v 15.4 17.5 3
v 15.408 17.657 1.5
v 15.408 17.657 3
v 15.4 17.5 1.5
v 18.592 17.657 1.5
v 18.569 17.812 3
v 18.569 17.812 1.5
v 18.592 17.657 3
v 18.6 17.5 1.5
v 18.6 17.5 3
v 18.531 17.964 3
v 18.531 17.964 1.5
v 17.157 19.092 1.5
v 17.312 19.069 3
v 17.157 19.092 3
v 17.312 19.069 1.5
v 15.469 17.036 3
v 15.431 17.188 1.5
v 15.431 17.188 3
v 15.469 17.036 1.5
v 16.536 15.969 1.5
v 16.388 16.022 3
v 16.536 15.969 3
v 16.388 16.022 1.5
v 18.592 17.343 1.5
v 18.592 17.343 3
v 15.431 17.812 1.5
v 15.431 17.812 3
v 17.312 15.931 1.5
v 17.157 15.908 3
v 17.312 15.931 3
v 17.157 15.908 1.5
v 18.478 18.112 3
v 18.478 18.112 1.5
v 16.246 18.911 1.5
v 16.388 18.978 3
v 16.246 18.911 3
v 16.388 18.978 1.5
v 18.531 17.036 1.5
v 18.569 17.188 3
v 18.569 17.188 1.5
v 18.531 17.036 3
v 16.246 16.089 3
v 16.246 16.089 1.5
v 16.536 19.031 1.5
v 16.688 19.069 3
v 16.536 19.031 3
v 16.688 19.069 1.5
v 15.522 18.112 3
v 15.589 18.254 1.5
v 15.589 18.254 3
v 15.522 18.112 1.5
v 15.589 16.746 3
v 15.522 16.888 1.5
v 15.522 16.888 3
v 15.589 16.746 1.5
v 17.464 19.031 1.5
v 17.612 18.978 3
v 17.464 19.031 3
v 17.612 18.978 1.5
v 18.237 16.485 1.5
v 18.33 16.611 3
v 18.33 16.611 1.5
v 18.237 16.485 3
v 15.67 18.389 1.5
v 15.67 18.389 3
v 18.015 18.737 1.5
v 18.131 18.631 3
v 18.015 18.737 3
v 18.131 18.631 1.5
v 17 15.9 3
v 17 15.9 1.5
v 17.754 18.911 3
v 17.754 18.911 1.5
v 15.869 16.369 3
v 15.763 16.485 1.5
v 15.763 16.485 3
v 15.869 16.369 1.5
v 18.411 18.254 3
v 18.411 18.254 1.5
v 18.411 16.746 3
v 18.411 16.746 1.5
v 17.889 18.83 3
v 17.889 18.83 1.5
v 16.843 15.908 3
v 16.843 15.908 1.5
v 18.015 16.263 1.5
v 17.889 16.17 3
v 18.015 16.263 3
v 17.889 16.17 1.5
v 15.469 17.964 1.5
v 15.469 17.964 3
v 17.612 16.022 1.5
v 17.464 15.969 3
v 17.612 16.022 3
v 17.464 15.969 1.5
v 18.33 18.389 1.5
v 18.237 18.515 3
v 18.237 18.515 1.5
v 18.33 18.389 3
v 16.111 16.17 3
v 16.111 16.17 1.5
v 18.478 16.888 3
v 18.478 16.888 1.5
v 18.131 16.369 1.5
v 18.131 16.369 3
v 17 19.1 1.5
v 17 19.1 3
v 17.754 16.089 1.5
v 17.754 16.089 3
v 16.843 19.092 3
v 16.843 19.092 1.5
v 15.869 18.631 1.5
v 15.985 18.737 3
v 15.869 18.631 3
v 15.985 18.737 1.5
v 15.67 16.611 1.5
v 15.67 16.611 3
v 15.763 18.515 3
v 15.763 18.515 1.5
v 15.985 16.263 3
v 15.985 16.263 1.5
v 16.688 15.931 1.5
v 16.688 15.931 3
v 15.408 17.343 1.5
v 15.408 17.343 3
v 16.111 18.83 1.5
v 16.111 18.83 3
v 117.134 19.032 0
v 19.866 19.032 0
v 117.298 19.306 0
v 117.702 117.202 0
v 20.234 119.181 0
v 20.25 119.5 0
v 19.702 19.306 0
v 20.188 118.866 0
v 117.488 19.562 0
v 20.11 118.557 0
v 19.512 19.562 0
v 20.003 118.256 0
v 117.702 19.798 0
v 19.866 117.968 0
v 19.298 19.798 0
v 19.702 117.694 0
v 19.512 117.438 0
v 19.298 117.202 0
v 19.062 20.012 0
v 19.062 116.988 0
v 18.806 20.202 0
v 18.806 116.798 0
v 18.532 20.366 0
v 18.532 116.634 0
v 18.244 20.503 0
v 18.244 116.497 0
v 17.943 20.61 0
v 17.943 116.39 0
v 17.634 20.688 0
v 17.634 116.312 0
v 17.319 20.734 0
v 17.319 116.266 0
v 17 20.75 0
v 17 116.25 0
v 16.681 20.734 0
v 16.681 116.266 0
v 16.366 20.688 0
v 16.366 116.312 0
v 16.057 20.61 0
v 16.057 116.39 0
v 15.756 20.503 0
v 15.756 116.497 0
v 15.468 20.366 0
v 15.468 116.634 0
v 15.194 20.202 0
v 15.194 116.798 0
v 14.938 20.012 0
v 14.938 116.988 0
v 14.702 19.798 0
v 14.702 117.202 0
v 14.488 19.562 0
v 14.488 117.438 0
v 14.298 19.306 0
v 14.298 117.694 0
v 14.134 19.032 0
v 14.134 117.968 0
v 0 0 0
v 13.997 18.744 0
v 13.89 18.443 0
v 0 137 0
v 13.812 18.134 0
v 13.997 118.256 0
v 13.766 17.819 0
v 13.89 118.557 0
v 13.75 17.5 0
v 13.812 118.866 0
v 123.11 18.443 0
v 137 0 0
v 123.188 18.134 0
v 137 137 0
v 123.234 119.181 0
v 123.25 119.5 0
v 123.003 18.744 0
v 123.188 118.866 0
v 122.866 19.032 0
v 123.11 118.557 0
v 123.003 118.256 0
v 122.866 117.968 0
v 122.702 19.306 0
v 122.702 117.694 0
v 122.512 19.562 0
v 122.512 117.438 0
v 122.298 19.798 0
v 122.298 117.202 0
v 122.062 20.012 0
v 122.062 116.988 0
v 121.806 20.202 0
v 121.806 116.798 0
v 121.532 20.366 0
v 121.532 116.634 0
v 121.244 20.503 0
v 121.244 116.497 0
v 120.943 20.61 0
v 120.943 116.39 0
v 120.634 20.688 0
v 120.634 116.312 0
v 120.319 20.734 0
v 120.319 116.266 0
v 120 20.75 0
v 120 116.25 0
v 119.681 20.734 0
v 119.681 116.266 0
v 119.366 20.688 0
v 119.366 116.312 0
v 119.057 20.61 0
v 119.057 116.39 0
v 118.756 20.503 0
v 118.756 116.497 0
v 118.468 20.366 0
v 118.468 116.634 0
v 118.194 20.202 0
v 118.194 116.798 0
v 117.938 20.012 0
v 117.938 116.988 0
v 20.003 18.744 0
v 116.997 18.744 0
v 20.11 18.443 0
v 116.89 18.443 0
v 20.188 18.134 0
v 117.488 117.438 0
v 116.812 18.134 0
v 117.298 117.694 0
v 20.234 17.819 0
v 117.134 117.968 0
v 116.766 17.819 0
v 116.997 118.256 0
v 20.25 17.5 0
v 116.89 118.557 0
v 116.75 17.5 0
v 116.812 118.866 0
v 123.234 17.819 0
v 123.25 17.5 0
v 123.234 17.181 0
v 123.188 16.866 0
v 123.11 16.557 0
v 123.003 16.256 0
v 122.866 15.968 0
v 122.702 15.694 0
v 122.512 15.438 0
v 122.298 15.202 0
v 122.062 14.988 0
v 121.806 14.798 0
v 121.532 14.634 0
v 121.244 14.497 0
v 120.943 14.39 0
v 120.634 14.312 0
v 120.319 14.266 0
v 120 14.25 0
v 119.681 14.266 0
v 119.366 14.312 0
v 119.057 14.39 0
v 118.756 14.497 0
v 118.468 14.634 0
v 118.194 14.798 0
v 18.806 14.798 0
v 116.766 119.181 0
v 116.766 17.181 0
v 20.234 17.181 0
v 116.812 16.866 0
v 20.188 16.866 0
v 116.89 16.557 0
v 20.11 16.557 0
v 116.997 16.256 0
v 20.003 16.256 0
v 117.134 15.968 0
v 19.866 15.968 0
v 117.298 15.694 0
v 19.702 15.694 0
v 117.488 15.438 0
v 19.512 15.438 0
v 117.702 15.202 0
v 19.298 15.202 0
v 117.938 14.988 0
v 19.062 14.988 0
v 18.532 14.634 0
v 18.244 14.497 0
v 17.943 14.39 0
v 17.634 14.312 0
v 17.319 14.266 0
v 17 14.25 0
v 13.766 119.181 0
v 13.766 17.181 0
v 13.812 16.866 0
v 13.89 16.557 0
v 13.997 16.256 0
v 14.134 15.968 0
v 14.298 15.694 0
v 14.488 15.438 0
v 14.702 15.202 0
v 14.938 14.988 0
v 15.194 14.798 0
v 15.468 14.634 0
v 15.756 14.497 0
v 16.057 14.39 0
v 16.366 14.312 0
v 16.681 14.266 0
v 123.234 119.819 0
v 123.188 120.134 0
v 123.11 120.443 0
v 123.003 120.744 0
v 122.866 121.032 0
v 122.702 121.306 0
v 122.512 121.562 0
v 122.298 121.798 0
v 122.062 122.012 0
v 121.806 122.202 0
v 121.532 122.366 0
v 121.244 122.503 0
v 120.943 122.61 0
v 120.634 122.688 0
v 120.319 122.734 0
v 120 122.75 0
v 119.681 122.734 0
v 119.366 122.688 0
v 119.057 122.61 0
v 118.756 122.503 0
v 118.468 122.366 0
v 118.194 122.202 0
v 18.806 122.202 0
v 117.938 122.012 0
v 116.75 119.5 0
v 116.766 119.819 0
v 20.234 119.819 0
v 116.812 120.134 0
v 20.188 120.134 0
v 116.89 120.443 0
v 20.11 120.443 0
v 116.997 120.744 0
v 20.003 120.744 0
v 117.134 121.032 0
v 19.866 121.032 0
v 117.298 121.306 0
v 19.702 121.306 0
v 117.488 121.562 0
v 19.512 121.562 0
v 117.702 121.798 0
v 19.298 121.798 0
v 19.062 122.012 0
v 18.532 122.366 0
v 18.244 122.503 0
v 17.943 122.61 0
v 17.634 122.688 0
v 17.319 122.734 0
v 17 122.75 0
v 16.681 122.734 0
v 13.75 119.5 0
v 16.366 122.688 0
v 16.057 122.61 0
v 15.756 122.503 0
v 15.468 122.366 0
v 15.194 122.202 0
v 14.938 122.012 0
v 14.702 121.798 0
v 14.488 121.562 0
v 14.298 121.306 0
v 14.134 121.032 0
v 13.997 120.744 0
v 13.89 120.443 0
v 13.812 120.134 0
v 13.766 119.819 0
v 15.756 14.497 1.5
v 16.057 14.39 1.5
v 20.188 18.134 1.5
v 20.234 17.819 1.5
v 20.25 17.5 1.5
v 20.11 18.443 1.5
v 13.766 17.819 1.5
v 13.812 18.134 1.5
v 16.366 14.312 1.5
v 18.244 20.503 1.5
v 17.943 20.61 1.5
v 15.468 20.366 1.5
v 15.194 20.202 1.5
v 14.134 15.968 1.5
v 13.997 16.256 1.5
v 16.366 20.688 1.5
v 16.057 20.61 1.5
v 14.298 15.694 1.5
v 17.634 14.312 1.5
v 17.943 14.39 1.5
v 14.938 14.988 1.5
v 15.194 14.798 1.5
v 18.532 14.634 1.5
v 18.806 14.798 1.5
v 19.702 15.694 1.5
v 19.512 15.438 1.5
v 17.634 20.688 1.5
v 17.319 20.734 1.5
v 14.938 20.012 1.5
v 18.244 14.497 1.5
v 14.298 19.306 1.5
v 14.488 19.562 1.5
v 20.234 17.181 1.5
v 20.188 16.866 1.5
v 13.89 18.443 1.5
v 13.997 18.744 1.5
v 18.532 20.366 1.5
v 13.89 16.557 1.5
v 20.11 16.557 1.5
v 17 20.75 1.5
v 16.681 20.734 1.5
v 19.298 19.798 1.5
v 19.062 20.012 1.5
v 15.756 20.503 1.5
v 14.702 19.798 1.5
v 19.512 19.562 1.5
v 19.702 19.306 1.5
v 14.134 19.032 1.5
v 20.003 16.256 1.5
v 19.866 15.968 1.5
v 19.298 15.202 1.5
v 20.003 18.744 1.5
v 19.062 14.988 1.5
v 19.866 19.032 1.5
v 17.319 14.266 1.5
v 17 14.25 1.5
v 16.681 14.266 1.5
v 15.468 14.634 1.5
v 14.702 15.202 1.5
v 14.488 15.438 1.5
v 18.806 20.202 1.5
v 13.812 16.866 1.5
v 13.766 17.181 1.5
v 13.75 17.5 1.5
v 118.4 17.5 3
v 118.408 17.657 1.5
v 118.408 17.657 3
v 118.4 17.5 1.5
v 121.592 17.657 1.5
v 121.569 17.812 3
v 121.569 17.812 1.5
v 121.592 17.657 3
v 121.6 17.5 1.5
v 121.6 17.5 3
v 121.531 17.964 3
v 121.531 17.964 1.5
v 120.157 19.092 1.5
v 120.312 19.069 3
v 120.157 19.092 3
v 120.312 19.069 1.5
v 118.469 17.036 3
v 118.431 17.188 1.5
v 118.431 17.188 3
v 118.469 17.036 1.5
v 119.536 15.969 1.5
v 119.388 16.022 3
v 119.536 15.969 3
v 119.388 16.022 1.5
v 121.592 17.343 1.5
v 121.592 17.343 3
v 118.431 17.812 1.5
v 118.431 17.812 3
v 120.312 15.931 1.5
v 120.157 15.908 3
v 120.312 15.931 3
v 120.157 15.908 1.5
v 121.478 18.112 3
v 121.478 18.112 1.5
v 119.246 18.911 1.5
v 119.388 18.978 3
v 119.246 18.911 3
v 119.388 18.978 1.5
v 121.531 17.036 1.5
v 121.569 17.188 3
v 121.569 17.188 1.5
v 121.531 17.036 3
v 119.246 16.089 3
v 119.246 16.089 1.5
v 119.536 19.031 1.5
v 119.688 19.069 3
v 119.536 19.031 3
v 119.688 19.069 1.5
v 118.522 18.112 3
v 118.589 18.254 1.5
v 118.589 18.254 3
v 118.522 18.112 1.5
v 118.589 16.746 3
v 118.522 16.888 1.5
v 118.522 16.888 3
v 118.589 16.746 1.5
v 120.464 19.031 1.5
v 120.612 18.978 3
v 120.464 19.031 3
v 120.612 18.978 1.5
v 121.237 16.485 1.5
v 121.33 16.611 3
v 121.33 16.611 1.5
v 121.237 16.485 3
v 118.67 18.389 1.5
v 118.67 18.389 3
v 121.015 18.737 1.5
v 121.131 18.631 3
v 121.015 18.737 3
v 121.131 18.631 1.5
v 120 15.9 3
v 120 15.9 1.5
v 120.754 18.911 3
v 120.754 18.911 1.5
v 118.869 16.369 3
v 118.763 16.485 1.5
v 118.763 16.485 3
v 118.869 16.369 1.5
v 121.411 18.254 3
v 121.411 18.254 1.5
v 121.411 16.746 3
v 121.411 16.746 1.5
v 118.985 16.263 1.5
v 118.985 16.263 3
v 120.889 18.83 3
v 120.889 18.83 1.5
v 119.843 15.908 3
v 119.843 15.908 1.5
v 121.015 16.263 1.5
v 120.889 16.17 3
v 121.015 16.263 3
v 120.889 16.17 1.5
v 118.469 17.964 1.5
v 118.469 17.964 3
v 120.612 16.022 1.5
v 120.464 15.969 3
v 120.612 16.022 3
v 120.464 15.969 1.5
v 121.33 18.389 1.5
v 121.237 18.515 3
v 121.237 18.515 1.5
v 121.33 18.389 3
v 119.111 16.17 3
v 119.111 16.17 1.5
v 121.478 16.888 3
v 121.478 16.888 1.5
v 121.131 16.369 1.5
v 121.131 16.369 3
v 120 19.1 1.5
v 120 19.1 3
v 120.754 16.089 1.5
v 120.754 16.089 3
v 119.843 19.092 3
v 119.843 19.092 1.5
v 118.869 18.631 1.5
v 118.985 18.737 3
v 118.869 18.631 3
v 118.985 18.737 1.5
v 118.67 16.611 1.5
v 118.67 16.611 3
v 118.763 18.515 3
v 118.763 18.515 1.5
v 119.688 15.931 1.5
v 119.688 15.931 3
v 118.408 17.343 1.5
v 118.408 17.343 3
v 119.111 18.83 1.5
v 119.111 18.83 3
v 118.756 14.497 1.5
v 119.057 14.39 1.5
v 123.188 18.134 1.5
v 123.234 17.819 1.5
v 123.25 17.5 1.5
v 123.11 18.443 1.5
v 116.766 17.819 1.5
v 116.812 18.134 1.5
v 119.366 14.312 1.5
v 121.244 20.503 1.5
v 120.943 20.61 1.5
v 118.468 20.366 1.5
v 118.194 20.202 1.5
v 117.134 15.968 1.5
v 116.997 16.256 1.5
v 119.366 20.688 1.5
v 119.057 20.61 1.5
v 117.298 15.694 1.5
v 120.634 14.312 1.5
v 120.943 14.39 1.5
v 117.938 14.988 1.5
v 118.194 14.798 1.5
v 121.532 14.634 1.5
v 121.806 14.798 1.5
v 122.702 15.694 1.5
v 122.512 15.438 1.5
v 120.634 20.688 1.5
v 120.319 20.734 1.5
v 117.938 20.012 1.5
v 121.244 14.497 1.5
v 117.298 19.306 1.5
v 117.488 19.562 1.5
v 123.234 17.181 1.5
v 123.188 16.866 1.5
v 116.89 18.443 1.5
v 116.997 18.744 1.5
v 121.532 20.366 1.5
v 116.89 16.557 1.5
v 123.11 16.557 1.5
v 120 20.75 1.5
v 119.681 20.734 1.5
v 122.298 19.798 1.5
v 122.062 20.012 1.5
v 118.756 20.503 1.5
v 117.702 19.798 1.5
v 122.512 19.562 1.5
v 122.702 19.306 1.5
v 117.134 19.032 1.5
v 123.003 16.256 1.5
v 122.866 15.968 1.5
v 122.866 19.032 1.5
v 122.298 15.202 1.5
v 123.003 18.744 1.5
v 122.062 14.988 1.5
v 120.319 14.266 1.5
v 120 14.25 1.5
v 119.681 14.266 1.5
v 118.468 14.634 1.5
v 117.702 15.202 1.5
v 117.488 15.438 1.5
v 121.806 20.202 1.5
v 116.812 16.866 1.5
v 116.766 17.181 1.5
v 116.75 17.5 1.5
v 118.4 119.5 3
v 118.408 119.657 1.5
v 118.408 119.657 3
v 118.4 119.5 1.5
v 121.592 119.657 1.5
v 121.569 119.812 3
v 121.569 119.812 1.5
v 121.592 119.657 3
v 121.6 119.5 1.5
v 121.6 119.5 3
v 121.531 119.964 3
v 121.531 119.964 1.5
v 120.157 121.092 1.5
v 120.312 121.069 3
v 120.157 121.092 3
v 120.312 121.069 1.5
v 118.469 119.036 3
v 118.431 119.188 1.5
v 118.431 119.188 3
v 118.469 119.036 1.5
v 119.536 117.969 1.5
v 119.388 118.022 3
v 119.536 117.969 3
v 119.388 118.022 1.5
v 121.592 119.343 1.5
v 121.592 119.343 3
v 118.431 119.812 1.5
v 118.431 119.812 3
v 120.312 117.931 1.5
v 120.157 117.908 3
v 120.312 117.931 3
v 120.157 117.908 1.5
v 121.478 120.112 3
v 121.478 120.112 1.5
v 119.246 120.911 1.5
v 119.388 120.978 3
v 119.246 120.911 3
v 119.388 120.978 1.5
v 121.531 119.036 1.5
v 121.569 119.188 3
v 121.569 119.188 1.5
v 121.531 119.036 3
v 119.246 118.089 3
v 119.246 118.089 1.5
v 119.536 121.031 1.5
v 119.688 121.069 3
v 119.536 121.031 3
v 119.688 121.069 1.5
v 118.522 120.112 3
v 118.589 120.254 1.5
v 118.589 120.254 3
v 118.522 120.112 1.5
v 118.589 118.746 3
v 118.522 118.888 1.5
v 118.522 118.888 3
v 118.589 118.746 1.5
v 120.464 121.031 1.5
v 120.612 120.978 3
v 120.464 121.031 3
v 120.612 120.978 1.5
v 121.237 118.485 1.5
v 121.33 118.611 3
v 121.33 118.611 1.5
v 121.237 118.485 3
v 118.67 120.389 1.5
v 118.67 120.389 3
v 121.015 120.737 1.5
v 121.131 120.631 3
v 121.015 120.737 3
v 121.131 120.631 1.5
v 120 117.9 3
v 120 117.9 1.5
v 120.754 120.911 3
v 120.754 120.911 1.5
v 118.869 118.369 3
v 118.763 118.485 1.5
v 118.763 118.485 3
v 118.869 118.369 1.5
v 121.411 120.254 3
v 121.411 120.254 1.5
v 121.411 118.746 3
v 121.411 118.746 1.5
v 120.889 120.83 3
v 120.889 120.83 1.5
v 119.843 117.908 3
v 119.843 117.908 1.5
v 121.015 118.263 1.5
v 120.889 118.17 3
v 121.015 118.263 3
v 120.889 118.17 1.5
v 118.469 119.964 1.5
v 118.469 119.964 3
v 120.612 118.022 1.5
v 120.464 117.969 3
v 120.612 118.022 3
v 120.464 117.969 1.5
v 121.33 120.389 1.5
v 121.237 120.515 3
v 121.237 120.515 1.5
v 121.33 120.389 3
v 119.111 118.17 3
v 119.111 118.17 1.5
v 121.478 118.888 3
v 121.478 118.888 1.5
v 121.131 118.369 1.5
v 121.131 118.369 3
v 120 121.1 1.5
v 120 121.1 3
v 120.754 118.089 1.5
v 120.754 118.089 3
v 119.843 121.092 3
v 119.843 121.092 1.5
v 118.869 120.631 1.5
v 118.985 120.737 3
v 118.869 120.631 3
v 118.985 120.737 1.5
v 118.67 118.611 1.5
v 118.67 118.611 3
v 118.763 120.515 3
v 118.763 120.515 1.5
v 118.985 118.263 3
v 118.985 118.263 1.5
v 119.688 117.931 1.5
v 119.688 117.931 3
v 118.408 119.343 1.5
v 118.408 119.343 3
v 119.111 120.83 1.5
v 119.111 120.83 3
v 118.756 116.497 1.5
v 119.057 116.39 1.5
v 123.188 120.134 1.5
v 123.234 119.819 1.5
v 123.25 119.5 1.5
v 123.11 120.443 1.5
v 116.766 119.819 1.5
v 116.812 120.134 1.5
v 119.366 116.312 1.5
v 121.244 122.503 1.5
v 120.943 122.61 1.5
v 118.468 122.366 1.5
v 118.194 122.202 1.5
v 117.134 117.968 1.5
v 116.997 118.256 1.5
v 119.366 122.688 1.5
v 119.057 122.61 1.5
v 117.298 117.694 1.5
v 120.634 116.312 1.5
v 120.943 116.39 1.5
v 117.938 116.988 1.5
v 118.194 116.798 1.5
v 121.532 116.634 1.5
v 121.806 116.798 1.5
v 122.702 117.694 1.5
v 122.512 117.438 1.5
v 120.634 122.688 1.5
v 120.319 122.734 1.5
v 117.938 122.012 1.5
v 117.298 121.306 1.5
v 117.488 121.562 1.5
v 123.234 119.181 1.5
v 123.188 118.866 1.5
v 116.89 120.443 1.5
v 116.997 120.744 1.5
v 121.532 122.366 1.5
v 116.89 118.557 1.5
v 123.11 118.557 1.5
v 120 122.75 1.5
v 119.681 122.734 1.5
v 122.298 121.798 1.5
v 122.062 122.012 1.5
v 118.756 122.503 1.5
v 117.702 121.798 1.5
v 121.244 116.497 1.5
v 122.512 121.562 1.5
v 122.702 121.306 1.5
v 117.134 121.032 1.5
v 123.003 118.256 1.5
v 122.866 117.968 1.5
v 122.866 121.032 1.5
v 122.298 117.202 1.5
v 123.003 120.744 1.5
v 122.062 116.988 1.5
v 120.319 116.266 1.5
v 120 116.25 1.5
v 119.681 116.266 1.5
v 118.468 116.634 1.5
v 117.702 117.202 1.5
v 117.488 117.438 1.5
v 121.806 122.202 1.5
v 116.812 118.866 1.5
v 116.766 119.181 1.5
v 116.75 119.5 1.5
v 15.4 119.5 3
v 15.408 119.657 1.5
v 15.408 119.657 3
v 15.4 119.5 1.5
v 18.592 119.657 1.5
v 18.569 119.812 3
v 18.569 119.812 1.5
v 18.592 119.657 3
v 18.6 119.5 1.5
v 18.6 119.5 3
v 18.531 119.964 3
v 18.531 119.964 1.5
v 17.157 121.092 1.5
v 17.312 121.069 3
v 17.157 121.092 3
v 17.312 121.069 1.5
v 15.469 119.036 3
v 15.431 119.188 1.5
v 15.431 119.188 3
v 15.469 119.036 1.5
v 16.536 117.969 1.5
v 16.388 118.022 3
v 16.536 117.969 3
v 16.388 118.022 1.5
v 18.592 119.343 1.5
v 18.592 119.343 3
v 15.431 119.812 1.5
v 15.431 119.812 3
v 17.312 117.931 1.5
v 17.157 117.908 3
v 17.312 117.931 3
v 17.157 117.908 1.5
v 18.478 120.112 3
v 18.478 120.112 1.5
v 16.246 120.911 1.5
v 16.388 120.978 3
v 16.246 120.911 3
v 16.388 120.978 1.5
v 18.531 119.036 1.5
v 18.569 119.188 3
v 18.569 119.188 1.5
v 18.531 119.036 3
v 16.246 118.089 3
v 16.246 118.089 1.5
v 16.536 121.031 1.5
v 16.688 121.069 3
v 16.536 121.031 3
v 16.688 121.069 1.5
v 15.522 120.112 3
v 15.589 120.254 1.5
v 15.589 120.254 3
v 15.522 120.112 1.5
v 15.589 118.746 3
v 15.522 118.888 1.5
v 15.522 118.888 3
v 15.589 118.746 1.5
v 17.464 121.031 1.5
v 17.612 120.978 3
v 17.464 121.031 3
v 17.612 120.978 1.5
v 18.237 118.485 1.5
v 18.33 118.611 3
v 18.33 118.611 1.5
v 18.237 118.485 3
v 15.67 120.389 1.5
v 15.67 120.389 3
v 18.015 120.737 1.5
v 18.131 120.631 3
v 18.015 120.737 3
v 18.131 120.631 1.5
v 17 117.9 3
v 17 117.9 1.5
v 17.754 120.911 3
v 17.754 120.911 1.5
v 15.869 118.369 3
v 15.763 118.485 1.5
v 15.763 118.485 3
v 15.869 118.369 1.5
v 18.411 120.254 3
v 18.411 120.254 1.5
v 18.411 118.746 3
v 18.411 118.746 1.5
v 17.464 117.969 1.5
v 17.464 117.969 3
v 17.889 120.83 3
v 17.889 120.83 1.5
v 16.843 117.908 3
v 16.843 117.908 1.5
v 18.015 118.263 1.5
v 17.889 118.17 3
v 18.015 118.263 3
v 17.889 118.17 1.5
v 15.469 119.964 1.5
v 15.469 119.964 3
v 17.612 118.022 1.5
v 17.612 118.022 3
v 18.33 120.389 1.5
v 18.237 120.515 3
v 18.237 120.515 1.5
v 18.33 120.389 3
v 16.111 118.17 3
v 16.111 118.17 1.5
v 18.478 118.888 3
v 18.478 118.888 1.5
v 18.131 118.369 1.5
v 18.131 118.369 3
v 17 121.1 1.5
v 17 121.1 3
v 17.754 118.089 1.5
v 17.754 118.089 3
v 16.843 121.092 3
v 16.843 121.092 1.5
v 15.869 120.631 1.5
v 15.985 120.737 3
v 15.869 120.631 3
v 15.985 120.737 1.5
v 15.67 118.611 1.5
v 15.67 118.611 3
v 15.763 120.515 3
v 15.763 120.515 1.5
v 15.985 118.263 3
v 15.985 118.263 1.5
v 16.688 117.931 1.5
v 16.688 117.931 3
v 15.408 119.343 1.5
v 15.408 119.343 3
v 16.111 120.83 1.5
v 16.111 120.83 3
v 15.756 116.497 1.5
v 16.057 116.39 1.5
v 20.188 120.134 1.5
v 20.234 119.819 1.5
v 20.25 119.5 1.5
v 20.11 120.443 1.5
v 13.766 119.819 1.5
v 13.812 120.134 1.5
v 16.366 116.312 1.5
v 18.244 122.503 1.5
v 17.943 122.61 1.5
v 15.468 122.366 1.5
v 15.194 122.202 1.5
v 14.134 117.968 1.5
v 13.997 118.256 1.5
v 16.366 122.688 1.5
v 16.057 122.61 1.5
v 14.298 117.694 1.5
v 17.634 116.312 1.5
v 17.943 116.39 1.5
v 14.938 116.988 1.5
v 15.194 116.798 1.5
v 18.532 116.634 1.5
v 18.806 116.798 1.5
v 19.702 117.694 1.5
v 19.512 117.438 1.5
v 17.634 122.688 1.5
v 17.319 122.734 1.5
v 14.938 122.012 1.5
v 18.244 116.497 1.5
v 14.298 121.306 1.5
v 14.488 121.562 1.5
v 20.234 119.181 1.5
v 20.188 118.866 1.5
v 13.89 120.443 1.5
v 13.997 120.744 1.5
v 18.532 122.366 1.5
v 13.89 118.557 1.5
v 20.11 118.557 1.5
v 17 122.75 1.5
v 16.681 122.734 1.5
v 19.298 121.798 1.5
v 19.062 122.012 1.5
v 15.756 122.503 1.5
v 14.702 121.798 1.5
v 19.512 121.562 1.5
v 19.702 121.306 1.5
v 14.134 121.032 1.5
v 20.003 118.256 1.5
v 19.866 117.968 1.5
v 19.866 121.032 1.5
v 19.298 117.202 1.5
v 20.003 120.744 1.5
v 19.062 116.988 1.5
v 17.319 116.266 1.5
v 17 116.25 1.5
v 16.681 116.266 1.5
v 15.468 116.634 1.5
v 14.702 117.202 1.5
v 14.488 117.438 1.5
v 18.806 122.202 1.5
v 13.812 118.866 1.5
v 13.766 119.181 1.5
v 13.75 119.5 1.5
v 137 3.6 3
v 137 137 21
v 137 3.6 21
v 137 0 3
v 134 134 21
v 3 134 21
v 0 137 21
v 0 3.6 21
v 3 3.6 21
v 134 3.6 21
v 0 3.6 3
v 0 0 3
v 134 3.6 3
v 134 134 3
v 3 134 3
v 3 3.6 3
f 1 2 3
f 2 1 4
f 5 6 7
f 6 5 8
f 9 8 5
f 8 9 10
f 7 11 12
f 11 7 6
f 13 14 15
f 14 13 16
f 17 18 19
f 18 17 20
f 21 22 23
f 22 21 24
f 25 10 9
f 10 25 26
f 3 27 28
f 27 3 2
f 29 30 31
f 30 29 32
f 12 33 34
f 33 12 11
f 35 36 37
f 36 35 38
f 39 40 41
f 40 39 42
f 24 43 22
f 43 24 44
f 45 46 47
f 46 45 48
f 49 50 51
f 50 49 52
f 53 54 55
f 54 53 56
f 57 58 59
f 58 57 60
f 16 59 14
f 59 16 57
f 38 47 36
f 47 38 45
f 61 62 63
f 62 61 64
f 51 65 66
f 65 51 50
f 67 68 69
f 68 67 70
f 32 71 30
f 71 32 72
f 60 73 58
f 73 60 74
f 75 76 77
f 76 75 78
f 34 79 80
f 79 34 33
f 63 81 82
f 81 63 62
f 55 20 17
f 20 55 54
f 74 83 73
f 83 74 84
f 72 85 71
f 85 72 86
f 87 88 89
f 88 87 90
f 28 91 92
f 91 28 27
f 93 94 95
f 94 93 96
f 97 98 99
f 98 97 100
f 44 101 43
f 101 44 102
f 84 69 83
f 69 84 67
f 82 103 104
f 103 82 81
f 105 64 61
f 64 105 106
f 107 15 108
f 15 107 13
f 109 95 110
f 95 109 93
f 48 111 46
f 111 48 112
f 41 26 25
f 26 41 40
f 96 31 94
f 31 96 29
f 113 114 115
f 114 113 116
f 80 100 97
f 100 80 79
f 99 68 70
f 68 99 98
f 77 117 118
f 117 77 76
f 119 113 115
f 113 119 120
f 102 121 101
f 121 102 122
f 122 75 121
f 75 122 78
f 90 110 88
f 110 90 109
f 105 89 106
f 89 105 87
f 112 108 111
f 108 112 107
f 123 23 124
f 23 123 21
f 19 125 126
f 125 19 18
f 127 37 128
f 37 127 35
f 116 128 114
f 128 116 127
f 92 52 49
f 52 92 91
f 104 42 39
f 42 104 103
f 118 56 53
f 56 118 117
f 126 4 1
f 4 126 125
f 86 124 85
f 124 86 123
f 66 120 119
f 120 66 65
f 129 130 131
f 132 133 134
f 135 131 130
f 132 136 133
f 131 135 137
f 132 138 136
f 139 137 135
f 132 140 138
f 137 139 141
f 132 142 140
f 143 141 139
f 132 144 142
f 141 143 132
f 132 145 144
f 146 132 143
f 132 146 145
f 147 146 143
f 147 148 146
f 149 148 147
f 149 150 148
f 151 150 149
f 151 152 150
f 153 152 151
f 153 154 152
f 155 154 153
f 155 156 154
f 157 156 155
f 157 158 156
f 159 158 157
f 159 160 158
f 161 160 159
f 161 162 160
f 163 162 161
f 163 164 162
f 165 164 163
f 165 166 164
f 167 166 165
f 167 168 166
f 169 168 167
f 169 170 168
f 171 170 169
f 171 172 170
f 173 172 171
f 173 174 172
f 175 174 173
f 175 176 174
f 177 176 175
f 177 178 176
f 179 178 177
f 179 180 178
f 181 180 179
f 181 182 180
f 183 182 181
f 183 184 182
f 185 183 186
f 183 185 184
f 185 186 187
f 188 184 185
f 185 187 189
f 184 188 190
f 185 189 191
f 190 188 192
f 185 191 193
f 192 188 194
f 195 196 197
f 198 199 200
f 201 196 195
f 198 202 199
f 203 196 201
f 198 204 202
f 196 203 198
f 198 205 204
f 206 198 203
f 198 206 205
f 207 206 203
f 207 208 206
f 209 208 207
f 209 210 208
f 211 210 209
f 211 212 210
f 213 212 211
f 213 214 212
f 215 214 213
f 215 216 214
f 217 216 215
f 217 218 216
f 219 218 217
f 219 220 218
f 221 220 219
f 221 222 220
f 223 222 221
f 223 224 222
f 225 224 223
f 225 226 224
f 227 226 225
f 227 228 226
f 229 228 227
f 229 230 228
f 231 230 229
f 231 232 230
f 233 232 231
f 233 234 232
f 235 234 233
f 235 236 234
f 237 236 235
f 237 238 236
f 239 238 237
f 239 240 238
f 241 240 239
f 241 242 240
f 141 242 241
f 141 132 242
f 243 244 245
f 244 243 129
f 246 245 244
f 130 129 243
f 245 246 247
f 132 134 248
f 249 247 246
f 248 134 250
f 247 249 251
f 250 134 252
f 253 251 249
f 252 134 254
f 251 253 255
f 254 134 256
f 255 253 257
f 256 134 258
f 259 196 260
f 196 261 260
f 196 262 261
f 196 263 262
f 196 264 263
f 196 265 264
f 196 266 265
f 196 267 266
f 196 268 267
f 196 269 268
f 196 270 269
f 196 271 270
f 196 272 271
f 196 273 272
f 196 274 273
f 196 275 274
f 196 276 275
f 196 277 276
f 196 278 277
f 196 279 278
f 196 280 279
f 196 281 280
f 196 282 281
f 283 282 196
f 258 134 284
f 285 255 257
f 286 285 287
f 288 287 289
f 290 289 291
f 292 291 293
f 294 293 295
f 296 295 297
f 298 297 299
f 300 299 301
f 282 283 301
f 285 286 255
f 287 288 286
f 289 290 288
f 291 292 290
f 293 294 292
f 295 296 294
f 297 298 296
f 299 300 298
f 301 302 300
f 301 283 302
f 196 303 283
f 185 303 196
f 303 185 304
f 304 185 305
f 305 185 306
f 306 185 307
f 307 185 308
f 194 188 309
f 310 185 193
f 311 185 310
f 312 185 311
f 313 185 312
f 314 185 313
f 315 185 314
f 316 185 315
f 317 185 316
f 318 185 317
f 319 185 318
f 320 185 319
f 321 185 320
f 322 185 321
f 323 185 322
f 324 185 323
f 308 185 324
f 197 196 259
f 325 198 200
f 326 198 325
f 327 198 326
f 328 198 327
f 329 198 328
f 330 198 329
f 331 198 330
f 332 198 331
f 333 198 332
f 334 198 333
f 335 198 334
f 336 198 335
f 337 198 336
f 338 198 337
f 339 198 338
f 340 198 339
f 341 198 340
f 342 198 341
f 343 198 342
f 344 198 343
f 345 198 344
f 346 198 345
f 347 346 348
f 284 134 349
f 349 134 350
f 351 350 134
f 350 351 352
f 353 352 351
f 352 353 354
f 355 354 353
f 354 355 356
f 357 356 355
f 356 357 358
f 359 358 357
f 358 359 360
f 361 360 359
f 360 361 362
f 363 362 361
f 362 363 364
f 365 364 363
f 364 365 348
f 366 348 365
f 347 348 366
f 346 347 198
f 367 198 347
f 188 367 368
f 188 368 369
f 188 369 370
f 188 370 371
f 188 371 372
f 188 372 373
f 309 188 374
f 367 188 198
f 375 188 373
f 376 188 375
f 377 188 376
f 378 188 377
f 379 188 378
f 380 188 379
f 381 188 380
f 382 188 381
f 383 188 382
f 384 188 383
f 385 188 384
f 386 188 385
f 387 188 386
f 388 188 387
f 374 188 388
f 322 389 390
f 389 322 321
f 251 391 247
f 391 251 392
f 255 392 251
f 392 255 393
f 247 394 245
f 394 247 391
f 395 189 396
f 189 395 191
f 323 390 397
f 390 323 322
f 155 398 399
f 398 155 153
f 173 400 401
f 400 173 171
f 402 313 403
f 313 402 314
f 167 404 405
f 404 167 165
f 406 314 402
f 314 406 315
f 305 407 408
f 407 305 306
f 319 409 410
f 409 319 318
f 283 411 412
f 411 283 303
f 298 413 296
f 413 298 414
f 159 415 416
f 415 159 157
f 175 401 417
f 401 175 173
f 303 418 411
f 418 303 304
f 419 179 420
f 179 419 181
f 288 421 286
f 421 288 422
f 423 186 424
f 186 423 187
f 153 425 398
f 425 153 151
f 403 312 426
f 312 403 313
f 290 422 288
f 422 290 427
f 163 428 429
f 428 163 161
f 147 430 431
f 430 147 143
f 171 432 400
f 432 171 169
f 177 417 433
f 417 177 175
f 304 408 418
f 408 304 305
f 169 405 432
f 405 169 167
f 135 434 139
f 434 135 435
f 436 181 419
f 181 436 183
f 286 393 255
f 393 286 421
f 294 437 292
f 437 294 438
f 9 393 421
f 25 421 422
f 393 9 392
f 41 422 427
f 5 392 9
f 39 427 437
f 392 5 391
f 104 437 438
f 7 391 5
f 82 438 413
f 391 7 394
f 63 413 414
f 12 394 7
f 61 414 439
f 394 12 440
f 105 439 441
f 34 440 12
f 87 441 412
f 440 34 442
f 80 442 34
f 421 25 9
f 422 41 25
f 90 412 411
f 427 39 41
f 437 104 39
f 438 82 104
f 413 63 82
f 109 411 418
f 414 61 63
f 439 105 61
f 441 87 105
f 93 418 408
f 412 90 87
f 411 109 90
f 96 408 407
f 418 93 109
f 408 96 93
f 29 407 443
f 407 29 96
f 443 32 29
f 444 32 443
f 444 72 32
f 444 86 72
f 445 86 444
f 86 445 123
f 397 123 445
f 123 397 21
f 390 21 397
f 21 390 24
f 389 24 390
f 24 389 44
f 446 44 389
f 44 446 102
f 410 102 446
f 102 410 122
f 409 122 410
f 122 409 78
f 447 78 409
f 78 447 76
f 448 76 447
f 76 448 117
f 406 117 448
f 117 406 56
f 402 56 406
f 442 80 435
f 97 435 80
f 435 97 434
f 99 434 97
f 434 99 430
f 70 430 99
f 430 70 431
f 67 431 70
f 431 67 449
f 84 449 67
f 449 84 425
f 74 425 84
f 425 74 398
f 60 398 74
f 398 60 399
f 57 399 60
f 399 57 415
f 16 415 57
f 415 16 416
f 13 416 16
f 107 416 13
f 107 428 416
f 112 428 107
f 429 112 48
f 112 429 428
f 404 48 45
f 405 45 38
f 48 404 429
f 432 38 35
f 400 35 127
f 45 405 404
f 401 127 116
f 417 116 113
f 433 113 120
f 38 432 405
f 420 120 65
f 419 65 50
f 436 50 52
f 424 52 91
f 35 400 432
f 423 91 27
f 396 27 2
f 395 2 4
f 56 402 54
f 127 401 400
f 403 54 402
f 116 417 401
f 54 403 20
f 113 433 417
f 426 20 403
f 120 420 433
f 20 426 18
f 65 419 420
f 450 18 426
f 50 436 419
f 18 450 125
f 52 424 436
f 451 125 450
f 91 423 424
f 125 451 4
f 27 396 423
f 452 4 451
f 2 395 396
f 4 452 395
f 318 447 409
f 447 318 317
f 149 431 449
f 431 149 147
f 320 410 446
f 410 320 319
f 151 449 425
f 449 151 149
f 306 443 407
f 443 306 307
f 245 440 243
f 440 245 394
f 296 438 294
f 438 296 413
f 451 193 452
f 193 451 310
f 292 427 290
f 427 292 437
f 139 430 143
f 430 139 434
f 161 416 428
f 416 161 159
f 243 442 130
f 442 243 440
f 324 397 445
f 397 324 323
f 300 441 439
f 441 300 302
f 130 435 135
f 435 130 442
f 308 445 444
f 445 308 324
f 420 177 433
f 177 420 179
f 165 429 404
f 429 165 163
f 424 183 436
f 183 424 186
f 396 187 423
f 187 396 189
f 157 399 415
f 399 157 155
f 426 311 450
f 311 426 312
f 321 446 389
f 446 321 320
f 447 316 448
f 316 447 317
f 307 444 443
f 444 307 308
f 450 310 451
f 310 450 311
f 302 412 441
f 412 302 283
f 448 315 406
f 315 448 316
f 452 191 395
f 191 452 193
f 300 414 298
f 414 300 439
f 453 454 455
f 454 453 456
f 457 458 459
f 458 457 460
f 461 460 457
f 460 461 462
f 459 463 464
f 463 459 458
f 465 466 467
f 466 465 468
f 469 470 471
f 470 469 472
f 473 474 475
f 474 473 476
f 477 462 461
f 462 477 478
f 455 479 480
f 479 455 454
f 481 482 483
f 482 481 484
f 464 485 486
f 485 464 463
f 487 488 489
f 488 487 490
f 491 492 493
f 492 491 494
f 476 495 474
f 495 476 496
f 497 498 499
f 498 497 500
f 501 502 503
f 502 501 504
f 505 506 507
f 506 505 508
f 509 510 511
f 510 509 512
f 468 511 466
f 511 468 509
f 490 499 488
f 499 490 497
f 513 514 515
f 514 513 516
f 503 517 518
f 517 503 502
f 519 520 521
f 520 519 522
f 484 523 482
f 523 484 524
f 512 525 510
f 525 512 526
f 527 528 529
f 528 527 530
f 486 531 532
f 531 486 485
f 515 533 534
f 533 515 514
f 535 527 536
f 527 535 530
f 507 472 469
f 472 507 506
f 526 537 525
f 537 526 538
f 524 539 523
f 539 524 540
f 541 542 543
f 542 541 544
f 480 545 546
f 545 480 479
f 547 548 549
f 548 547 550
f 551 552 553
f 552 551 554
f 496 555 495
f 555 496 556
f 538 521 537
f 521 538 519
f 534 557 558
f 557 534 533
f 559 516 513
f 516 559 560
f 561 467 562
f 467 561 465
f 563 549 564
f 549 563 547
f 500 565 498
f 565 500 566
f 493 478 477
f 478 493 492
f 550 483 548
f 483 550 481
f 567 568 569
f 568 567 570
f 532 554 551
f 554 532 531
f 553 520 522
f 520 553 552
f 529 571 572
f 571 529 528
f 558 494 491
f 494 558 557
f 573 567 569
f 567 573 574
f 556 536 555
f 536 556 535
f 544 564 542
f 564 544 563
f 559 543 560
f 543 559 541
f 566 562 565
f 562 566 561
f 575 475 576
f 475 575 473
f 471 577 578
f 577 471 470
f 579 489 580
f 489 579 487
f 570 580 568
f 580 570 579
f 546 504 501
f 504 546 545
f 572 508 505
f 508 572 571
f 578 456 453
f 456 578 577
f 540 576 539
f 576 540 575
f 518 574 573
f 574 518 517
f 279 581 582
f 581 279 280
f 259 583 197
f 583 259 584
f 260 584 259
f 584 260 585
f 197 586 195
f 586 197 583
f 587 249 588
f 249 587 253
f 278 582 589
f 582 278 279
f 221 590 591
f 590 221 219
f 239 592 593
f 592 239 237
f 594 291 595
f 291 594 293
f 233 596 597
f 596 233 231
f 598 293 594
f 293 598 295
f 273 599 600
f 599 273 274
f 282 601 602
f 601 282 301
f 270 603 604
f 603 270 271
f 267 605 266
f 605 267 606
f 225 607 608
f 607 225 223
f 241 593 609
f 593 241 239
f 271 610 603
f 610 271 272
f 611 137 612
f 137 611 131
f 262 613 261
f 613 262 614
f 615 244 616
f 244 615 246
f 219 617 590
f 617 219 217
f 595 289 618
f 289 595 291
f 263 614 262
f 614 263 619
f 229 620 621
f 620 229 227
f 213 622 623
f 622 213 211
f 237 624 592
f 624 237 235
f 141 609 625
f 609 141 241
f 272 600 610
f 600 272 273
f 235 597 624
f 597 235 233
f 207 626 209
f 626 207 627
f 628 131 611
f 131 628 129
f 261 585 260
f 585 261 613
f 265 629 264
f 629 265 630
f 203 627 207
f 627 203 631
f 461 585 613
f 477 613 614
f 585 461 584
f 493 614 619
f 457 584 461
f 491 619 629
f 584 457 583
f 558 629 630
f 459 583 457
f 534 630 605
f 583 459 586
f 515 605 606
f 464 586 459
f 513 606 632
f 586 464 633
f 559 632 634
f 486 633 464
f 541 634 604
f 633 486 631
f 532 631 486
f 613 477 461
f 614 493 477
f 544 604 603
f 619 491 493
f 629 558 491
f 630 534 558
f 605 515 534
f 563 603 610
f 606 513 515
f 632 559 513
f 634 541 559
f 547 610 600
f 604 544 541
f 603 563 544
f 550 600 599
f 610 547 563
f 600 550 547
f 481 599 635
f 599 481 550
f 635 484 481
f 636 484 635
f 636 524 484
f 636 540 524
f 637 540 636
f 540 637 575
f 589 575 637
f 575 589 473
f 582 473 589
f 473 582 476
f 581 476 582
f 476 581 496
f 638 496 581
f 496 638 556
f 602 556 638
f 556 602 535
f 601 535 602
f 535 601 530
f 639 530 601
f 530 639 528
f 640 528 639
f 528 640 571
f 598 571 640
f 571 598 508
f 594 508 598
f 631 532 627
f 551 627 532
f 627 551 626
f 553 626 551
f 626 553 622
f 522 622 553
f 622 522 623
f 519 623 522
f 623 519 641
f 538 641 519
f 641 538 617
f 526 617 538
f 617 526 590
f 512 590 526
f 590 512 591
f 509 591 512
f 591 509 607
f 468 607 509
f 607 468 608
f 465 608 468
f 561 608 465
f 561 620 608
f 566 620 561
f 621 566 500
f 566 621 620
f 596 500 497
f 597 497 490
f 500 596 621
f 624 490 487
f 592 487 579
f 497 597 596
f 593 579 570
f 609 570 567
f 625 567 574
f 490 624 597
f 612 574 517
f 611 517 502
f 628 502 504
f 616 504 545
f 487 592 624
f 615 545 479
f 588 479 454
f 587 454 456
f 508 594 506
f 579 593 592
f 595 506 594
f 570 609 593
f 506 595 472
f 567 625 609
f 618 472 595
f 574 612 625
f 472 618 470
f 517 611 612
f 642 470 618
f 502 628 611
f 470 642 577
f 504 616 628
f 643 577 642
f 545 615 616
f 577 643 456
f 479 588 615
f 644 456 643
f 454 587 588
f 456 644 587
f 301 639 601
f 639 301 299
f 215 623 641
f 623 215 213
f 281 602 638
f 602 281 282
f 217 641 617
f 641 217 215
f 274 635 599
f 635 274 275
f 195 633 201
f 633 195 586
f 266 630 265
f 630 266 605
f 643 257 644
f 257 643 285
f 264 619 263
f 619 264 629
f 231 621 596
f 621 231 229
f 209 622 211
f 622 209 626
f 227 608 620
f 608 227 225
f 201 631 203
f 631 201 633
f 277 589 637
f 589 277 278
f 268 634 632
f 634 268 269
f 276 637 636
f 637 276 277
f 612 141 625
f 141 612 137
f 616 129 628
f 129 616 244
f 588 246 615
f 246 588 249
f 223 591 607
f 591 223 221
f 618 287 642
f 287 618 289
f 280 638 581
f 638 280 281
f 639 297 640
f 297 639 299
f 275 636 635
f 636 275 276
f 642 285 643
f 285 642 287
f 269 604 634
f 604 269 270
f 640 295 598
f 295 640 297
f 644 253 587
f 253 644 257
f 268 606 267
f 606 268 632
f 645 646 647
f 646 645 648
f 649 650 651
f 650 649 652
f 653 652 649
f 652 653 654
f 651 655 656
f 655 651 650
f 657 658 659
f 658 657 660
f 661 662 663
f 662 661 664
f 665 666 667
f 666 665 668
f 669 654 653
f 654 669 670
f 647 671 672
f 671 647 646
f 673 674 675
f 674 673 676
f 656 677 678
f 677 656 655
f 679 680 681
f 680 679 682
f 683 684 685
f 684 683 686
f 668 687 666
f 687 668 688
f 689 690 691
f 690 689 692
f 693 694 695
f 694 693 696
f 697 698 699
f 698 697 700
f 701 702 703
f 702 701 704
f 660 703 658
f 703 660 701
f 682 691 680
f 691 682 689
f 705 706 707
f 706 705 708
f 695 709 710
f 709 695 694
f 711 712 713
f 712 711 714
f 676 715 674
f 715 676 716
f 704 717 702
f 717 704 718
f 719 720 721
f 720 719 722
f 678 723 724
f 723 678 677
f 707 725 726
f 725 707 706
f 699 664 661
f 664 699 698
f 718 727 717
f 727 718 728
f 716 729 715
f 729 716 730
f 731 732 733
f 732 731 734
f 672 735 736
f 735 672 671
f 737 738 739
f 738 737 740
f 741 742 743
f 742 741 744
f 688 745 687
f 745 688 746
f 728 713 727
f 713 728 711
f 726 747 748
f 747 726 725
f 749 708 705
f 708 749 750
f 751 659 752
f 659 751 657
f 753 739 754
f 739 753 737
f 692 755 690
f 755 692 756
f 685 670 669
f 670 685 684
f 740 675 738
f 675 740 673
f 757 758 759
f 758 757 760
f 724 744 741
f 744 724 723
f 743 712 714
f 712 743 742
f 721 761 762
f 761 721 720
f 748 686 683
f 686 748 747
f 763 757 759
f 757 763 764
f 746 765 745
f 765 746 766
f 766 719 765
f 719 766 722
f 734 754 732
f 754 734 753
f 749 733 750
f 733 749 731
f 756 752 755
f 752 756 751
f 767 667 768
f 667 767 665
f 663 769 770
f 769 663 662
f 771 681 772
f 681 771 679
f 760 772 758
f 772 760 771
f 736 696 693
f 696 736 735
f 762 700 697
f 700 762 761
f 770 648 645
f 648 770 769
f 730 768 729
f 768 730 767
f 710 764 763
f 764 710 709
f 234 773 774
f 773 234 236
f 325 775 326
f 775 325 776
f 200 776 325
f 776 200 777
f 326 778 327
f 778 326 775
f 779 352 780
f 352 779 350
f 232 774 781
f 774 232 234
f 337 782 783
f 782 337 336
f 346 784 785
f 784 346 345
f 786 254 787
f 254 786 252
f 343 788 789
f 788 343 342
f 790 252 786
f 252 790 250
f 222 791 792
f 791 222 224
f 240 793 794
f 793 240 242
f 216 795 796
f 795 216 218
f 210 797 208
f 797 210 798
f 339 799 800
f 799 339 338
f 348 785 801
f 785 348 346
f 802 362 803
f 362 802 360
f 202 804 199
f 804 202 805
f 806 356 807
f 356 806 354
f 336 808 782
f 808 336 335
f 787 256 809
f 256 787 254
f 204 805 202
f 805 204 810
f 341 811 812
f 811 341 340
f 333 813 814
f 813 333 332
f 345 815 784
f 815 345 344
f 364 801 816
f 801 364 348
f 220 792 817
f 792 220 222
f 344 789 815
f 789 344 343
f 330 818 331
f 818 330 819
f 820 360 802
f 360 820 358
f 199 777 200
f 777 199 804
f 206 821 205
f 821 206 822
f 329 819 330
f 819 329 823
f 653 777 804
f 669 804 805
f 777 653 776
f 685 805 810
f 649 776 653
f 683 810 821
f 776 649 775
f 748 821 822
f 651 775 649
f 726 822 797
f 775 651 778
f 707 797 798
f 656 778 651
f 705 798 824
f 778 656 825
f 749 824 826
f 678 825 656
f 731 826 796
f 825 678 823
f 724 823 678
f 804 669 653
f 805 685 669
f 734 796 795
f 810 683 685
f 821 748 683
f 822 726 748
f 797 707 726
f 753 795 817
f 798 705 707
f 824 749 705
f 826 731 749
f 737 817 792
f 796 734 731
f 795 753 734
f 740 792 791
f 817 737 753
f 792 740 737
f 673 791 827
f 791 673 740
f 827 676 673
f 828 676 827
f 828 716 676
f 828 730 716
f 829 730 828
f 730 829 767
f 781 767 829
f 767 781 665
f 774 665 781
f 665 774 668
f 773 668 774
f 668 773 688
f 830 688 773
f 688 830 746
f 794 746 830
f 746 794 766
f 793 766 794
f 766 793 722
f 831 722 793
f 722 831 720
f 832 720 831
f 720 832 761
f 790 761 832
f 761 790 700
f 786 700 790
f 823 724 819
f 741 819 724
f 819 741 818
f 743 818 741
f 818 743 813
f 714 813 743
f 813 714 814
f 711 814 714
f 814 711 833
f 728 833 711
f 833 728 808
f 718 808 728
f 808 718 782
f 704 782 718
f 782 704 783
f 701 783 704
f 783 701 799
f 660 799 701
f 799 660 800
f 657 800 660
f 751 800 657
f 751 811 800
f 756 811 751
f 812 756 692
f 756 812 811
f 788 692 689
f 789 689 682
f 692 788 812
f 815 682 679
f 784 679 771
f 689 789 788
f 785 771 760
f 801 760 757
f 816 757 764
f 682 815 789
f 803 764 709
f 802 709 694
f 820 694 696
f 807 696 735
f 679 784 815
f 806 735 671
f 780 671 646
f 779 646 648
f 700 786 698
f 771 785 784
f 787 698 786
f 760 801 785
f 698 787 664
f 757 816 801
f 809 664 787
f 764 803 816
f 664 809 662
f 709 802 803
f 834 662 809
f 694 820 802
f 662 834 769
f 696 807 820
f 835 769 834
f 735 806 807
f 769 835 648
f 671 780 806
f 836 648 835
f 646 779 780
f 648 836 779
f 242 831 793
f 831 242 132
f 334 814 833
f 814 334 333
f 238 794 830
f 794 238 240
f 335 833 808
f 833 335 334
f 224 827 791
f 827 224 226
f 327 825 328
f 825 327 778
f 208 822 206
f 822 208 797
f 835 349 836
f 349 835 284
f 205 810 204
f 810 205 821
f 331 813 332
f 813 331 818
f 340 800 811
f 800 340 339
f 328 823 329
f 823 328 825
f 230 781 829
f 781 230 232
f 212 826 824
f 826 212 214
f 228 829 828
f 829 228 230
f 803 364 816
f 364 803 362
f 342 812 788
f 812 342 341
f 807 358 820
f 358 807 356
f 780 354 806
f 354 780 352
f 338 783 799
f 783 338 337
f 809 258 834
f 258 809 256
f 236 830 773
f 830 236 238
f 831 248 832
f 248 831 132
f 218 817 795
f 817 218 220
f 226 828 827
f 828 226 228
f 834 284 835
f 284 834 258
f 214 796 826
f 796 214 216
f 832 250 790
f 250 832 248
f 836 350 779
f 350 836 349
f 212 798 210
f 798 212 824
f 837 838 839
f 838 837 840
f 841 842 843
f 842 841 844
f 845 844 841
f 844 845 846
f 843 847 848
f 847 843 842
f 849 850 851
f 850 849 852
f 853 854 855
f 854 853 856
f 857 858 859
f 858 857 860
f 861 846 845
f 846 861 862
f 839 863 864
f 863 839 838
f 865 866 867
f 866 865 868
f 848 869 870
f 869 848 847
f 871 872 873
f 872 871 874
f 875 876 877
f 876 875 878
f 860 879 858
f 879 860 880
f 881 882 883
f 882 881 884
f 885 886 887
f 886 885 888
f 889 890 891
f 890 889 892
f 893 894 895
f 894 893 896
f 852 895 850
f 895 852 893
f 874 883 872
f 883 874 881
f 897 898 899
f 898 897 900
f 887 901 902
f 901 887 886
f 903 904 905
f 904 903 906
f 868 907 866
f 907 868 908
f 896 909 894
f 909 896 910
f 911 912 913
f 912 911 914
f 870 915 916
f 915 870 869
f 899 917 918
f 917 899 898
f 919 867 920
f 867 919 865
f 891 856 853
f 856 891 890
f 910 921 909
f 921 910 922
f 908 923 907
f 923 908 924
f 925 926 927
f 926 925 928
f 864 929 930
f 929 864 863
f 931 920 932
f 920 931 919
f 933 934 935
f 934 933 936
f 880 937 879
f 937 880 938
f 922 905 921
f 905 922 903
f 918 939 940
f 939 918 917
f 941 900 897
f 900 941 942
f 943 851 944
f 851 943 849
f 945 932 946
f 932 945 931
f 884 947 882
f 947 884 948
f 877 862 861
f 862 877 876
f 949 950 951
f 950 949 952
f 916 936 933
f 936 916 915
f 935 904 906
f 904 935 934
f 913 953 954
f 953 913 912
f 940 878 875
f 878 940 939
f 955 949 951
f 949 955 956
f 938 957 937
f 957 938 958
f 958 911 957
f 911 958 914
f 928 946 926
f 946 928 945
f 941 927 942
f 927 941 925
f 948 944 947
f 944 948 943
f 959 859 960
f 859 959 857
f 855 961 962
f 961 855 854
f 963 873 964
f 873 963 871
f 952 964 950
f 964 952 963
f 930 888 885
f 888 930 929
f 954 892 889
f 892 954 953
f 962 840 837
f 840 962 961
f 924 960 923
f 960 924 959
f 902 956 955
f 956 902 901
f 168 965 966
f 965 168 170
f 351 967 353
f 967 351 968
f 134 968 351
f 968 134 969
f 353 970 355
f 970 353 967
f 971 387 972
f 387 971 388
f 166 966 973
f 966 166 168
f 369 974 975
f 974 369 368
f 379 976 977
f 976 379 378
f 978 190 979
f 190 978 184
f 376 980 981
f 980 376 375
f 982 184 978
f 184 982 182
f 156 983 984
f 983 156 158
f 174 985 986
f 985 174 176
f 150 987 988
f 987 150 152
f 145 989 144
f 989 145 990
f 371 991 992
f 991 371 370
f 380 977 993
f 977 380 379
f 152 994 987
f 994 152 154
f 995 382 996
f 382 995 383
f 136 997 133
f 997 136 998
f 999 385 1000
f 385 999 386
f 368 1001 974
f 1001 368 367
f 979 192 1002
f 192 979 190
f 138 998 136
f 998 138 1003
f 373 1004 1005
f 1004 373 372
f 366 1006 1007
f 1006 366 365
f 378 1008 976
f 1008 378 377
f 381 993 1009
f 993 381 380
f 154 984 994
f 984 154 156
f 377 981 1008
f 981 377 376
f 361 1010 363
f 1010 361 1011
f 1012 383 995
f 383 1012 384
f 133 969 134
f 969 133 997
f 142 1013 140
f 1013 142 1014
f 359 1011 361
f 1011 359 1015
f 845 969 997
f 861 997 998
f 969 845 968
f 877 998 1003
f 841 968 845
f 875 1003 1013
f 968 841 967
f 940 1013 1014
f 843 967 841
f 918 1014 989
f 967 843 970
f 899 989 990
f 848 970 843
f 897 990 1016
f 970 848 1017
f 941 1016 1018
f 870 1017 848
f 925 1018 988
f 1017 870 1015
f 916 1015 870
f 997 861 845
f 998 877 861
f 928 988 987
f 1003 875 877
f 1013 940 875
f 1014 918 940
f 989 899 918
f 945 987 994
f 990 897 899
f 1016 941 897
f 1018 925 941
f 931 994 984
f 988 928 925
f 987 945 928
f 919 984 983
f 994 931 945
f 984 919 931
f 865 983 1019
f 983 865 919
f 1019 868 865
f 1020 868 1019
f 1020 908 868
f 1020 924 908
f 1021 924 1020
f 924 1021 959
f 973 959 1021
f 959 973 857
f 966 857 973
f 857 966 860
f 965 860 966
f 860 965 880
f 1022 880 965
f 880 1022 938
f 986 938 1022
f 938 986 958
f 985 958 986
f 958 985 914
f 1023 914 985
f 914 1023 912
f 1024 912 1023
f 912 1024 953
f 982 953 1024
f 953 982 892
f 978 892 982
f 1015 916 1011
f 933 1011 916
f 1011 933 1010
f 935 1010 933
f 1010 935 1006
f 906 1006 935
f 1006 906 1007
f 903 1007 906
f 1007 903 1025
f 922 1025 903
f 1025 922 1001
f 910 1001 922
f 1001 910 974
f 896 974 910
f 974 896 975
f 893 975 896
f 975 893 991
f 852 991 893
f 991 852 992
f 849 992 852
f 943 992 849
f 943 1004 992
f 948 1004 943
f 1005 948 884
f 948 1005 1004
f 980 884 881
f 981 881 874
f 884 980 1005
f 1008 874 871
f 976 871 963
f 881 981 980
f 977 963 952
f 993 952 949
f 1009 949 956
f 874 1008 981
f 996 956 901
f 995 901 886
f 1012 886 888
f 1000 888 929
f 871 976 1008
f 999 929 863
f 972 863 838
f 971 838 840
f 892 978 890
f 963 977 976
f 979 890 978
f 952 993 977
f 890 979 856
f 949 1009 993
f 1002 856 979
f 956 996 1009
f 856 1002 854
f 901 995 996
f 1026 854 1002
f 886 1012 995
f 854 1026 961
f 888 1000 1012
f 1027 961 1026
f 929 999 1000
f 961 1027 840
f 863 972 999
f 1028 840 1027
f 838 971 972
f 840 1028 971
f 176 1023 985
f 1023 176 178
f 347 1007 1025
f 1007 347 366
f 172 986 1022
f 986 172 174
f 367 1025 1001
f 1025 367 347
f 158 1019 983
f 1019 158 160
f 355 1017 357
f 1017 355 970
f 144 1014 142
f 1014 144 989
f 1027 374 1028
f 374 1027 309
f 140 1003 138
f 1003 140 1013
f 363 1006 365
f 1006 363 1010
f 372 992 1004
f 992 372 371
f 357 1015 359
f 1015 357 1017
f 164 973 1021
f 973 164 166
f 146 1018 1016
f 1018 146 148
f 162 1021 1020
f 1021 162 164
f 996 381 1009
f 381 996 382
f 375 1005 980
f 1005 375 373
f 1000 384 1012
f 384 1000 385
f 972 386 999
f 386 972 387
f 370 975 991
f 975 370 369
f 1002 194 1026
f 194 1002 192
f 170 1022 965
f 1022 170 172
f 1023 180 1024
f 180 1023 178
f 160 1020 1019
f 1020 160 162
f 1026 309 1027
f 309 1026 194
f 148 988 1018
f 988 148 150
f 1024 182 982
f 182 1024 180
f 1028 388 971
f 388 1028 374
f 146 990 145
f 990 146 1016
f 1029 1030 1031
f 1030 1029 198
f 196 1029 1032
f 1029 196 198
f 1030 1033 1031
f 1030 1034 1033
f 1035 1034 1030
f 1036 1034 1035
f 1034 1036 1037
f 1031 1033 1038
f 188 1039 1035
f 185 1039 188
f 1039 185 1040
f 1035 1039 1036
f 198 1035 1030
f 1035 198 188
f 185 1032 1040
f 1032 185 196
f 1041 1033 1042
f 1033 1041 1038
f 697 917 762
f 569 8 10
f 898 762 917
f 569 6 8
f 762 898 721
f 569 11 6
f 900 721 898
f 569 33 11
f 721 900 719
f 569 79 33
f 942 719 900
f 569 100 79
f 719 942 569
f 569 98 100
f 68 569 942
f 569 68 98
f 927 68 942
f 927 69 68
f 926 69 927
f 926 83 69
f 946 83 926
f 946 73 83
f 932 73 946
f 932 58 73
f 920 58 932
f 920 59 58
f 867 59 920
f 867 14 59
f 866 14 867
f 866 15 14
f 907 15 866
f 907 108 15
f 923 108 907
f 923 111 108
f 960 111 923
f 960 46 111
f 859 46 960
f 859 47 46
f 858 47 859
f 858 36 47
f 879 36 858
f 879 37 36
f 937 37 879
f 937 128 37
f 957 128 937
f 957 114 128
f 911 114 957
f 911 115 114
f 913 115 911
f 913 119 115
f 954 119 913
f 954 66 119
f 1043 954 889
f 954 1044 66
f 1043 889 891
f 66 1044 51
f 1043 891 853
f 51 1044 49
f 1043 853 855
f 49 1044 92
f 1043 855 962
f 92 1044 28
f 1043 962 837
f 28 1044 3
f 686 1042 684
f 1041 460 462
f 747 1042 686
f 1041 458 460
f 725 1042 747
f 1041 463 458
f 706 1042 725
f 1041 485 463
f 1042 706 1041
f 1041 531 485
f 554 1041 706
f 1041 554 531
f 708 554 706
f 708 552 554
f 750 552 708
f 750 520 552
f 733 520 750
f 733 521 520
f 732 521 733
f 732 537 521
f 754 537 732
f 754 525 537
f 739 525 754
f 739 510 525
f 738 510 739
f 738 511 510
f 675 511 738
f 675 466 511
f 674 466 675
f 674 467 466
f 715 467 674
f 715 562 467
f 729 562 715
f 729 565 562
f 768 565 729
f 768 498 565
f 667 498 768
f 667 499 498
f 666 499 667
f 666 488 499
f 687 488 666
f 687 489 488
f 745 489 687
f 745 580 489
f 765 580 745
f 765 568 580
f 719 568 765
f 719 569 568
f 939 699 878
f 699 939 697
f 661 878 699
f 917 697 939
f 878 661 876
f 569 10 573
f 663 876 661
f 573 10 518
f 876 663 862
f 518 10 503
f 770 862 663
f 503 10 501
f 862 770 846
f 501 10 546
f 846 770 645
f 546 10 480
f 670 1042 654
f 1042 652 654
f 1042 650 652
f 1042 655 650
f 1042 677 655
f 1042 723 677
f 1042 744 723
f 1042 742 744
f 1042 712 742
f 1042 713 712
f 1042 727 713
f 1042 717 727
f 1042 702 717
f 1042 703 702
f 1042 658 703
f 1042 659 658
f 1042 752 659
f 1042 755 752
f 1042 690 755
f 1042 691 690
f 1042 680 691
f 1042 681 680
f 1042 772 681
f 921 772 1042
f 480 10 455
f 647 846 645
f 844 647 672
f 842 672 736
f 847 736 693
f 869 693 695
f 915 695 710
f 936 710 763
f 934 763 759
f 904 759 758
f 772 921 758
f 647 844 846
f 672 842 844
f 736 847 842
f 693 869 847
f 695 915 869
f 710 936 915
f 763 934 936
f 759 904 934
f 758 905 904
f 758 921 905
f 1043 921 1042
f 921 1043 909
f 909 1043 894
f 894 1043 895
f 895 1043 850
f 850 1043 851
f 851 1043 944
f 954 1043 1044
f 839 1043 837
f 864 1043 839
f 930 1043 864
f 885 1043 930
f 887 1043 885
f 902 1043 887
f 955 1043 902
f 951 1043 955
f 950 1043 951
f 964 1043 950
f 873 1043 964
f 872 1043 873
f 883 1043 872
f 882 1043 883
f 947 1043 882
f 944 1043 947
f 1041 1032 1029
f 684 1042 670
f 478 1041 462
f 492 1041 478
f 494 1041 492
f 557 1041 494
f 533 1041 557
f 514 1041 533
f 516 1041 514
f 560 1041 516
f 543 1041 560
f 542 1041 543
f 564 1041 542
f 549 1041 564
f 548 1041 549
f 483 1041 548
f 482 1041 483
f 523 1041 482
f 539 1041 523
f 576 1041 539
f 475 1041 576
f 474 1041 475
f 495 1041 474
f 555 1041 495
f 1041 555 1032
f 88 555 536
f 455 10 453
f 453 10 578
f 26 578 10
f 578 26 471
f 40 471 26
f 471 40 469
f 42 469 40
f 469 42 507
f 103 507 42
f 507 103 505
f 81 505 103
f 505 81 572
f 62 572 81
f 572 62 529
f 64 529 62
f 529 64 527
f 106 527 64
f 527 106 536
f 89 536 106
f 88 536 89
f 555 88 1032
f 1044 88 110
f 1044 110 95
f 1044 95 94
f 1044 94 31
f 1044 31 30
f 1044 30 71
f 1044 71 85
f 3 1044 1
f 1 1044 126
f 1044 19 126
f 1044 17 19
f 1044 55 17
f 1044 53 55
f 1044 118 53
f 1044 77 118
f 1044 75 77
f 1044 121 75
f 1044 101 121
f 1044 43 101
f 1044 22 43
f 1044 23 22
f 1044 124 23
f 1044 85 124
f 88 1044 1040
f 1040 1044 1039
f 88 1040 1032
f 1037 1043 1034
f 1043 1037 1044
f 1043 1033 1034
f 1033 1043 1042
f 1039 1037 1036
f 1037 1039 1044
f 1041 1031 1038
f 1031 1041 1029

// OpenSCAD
/*
  J401 Open-Top Mounting Tray (Centered Hole Pattern) — OPEN ONE SIDE COMPLETELY
  - Open from above (no lid)
  - One entire side wall removed for I/O cable access
  - Uses mounting-hole spacing:
      X (left-right) = 103.00 mm
      Y (top-bottom) = 102.00 mm
  - Tray has M3 clearance holes (3.2 mm) for screws from bottom into your standoffs

  Units: millimeters
*/

$fn = 64;

// -----------------------
// Core parameters
// -----------------------

// Approx board envelope (keep clearance generous)
board_x = 115;
board_y = 115;

// Mounting-hole rectangle (center-to-center)
mount_dx = 103;   // X spacing
mount_dy = 102;   // Y spacing

// Tray geometry
clearance_xy   = 8;   // space between board edge and tray walls
base_thickness = 3;
wall_thickness = 3;
wall_height    = 18;  // open-top tray wall height

// Mounting holes in tray (for screws from bottom into standoffs)
tray_hole_d = 3.2;    // M3 clearance
hole_relief_d = 6.5;  // optional screw head relief from bottom (set 0 to disable)
hole_relief_depth = 1.5;

// Remove an entire wall for I/O access
open_side = "front";  // "front" "back" "left" "right"

// Optional: feet holes
add_feet_holes = false;
feet_hole_d = 4.0;     // M4 clearance
feet_offset = 10;      // offset from outer corners

// -----------------------
// Derived dimensions
// -----------------------
inner_x = board_x + 2*clearance_xy;
inner_y = board_y + 2*clearance_xy;

outer_x = inner_x + 2*wall_thickness;
outer_y = inner_y + 2*wall_thickness;
outer_z = base_thickness + wall_height;

// Center of tray (origin for centered mounting)
cx = outer_x/2;
cy = outer_y/2;

// -----------------------
// Helpers
// -----------------------
module mounting_hole_at(x, y) {
  // Through-hole
  translate([x, y, 0])
    cylinder(h=outer_z + 1, d=tray_hole_d);

  // Optional screw head relief (counterbore) from bottom
  if (hole_relief_d > 0) {
    translate([x, y, 0])
      cylinder(h=hole_relief_depth, d=hole_relief_d);
  }
}

module feet_hole_at(x, y) {
  translate([x, y, 0])
    cylinder(h=base_thickness + 1, d=feet_hole_d);
}

// Removes the entire wall on the chosen side
module remove_entire_wall() {
  // We remove a rectangular slab that covers that wall region completely.
  // Add a small epsilon so subtraction always fully cuts.
  eps = 0.6;

  if (open_side == "front") { // y = 0 wall
    translate([-eps, -eps, base_thickness])
      cube([outer_x + 2*eps, wall_thickness + 2*eps, wall_height + 2*eps], center=false);

  } else if (open_side == "back") { // y = outer_y wall
    translate([-eps, outer_y - wall_thickness - eps, base_thickness])
      cube([outer_x + 2*eps, wall_thickness + 2*eps, wall_height + 2*eps], center=false);

  } else if (open_side == "left") { // x = 0 wall
    translate([-eps, -eps, base_thickness])
      cube([wall_thickness + 2*eps, outer_y + 2*eps, wall_height + 2*eps], center=false);

  } else if (open_side == "right") { // x = outer_x wall
    translate([outer_x - wall_thickness - eps, -eps, base_thickness])
      cube([wall_thickness + 2*eps, outer_y + 2*eps, wall_height + 2*eps], center=false);
  }
}

// -----------------------
// Hole positions (CENTERED rectangle)
// -----------------------
hole_positions = [
  [cx - mount_dx/2, cy - mount_dy/2],
  [cx + mount_dx/2, cy - mount_dy/2],
  [cx + mount_dx/2, cy + mount_dy/2],
  [cx - mount_dx/2, cy + mount_dy/2]
];

// -----------------------
// Main solid: tray (base + walls), open top, ONE SIDE WALL REMOVED
// -----------------------
difference() {
  // Outer block
  cube([outer_x, outer_y, outer_z], center=false);

  // Hollow interior (leaves base_thickness + walls)
  translate([wall_thickness, wall_thickness, base_thickness])
    cube([inner_x, inner_y, wall_height + 2], center=false);

  // Remove the entire chosen wall
  remove_entire_wall();

  // Mounting holes (for screws into your standoffs)
  for (p = hole_positions) {
    mounting_hole_at(p[0], p[1]);
  }

  // Optional feet holes near corners
  if (add_feet_holes && feet_hole_d > 0) {
    feet_hole_at(feet_offset, feet_offset);
    feet_hole_at(outer_x - feet_offset, feet_offset);
    feet_hole_at(outer_x - feet_offset, outer_y - feet_offset);
    feet_hole_at(feet_offset, outer_y - feet_offset);
  }
}
